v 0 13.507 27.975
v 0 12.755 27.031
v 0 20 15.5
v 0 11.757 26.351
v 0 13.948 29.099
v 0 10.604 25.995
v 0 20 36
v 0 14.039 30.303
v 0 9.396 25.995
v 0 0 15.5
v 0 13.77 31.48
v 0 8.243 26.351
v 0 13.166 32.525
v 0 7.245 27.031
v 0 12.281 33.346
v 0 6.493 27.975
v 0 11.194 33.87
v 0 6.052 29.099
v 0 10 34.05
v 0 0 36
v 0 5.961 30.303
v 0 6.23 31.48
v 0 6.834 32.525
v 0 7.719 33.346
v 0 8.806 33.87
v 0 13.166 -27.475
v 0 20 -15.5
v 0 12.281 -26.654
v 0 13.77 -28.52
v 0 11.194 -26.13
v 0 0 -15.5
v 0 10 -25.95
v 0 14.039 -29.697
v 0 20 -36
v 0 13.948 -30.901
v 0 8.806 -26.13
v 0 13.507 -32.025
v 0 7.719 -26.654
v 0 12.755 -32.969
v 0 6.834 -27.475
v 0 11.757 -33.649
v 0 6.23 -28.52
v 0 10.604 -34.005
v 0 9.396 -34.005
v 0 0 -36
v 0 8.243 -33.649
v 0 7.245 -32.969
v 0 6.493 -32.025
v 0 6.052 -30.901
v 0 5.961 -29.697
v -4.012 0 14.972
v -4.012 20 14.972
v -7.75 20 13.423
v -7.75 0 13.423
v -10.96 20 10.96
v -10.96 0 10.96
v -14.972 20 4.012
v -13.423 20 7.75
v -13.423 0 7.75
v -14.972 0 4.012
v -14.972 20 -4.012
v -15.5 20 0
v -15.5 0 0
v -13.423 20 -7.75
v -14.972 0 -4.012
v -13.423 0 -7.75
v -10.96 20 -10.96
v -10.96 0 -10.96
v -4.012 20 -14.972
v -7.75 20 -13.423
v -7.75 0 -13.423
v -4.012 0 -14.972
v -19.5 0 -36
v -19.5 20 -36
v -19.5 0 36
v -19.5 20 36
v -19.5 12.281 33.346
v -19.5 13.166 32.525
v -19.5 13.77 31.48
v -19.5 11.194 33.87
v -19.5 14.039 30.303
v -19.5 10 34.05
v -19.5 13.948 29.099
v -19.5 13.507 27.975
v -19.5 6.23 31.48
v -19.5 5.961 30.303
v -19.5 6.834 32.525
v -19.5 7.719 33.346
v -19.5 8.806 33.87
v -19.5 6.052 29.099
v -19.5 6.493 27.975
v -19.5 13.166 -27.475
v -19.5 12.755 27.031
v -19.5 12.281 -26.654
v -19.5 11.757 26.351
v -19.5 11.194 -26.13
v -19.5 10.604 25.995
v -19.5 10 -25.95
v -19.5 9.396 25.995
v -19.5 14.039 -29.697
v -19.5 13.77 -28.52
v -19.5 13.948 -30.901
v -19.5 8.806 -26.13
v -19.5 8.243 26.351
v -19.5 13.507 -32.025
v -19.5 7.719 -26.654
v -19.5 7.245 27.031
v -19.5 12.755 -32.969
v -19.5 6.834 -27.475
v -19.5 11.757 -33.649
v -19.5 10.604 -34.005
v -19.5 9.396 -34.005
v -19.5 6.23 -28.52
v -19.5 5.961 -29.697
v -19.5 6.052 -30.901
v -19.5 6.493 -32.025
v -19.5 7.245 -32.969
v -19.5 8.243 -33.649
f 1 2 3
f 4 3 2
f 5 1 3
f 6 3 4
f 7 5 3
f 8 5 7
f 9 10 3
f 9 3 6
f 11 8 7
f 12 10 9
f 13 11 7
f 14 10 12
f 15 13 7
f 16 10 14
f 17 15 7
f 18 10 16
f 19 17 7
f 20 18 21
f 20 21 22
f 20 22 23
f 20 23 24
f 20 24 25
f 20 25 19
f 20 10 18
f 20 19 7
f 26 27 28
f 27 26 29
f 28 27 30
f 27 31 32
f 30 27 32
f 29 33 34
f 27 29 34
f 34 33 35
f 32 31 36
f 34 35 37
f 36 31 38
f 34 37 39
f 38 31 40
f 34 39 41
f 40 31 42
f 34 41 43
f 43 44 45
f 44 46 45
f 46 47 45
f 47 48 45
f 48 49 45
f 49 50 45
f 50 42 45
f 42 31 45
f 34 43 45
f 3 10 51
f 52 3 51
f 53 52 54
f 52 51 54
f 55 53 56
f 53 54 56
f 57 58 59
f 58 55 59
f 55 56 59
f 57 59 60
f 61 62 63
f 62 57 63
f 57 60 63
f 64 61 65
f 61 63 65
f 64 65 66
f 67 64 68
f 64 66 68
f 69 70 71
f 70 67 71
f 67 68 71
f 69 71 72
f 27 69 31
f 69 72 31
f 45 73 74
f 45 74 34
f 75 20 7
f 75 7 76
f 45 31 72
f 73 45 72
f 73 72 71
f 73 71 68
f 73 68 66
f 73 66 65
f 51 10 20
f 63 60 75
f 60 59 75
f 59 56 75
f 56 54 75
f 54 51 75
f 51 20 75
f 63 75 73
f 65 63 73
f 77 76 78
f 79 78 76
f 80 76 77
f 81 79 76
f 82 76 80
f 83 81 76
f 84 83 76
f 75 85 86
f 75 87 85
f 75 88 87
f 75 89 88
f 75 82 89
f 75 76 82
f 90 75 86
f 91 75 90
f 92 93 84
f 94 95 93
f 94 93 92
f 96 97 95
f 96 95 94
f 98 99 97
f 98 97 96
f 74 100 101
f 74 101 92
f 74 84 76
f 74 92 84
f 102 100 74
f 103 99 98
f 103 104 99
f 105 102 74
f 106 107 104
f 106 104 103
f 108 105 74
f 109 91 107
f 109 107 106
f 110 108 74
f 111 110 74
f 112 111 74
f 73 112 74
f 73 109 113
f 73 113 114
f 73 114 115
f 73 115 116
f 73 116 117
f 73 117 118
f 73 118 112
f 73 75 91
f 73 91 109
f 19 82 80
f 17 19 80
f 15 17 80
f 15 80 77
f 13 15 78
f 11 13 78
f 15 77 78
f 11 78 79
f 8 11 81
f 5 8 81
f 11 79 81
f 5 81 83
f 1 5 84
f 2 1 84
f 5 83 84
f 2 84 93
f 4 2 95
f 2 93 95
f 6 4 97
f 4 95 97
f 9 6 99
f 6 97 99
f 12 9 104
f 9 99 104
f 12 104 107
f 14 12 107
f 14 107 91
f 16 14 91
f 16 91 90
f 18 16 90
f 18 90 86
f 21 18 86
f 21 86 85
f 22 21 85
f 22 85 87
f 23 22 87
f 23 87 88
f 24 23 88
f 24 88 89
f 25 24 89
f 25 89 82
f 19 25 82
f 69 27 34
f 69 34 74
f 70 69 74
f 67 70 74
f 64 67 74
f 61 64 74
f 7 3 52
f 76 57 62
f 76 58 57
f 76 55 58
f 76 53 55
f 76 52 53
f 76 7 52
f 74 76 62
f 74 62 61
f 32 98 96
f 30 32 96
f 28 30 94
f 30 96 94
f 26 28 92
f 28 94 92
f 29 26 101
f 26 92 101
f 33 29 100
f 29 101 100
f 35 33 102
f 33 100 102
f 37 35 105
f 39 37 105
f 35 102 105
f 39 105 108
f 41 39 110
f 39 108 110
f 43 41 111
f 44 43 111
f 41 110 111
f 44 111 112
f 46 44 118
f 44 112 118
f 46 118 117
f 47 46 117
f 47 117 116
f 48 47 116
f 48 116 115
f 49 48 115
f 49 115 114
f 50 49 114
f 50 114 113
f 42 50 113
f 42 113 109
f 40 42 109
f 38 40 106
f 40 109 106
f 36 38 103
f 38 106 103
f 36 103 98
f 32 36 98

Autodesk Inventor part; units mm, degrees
ref_plane "YZ Plane" through (0, 0, 0) normal (1, 0, 0) x (0, 1, 0)
ref_plane "XZ Plane" through (0, 0, 0) normal (0, 1, 0) x (-1, 0, 0)
ref_plane "XY Plane" through (0, 0, 0) normal (0, 0, 1) x (1, 0, 0)
sketch "Sketch3" plane through (0, 0, 0) normal (0, 1, 0) x (-1, 0, 0)
  arc A0 (0, -15.5) -> (0, 15.5) centre (0, 0) ccw
  line L0 (0, 15.5) -> (0, 36)
  line L1 (0, -15.5) -> (0, -36)
  line L2 (0, 36) -> (19.5, 36)
  line L3 (19.5, 36) -> (19.5, -36)
  line L4 (19.5, -36) -> (0, -36)
  dimension "d17" = 31
  dimension "d19" = 20.5
  dimension "d20" = 20.5
extrude "Extrusion3" add sketch "Sketch3" along normal blind 20
ref_plane "Work Plane2" through (-19.5, 0, -36) normal (-1, 0, 0) x (0, 0, 1)
sketch "Sketch4" plane through (-19.5, 0, -36) normal (-1, 0, 0) x (0, 0, 1)
  line L0 (0, 0) -> (0, 20) projected
  line L1 (0, 10) -> (6, 10)
  line L2 (72, 0) -> (72, 20) projected
  line L3 (72, 10) -> (66, 10)
  circle A0 centre (6, 10) radius 4.05
  circle A1 centre (66, 10) radius 4.05
  point P0 (36, 0)
  dimension "d25" = 6
  dimension "d26" = 6
  dimension "d27" = 8.1
  dimension "d28" = 8.1
extrude "Extrusion4" cut sketch "Sketch4" against normal blind 20
properties part number "mounpt2"
